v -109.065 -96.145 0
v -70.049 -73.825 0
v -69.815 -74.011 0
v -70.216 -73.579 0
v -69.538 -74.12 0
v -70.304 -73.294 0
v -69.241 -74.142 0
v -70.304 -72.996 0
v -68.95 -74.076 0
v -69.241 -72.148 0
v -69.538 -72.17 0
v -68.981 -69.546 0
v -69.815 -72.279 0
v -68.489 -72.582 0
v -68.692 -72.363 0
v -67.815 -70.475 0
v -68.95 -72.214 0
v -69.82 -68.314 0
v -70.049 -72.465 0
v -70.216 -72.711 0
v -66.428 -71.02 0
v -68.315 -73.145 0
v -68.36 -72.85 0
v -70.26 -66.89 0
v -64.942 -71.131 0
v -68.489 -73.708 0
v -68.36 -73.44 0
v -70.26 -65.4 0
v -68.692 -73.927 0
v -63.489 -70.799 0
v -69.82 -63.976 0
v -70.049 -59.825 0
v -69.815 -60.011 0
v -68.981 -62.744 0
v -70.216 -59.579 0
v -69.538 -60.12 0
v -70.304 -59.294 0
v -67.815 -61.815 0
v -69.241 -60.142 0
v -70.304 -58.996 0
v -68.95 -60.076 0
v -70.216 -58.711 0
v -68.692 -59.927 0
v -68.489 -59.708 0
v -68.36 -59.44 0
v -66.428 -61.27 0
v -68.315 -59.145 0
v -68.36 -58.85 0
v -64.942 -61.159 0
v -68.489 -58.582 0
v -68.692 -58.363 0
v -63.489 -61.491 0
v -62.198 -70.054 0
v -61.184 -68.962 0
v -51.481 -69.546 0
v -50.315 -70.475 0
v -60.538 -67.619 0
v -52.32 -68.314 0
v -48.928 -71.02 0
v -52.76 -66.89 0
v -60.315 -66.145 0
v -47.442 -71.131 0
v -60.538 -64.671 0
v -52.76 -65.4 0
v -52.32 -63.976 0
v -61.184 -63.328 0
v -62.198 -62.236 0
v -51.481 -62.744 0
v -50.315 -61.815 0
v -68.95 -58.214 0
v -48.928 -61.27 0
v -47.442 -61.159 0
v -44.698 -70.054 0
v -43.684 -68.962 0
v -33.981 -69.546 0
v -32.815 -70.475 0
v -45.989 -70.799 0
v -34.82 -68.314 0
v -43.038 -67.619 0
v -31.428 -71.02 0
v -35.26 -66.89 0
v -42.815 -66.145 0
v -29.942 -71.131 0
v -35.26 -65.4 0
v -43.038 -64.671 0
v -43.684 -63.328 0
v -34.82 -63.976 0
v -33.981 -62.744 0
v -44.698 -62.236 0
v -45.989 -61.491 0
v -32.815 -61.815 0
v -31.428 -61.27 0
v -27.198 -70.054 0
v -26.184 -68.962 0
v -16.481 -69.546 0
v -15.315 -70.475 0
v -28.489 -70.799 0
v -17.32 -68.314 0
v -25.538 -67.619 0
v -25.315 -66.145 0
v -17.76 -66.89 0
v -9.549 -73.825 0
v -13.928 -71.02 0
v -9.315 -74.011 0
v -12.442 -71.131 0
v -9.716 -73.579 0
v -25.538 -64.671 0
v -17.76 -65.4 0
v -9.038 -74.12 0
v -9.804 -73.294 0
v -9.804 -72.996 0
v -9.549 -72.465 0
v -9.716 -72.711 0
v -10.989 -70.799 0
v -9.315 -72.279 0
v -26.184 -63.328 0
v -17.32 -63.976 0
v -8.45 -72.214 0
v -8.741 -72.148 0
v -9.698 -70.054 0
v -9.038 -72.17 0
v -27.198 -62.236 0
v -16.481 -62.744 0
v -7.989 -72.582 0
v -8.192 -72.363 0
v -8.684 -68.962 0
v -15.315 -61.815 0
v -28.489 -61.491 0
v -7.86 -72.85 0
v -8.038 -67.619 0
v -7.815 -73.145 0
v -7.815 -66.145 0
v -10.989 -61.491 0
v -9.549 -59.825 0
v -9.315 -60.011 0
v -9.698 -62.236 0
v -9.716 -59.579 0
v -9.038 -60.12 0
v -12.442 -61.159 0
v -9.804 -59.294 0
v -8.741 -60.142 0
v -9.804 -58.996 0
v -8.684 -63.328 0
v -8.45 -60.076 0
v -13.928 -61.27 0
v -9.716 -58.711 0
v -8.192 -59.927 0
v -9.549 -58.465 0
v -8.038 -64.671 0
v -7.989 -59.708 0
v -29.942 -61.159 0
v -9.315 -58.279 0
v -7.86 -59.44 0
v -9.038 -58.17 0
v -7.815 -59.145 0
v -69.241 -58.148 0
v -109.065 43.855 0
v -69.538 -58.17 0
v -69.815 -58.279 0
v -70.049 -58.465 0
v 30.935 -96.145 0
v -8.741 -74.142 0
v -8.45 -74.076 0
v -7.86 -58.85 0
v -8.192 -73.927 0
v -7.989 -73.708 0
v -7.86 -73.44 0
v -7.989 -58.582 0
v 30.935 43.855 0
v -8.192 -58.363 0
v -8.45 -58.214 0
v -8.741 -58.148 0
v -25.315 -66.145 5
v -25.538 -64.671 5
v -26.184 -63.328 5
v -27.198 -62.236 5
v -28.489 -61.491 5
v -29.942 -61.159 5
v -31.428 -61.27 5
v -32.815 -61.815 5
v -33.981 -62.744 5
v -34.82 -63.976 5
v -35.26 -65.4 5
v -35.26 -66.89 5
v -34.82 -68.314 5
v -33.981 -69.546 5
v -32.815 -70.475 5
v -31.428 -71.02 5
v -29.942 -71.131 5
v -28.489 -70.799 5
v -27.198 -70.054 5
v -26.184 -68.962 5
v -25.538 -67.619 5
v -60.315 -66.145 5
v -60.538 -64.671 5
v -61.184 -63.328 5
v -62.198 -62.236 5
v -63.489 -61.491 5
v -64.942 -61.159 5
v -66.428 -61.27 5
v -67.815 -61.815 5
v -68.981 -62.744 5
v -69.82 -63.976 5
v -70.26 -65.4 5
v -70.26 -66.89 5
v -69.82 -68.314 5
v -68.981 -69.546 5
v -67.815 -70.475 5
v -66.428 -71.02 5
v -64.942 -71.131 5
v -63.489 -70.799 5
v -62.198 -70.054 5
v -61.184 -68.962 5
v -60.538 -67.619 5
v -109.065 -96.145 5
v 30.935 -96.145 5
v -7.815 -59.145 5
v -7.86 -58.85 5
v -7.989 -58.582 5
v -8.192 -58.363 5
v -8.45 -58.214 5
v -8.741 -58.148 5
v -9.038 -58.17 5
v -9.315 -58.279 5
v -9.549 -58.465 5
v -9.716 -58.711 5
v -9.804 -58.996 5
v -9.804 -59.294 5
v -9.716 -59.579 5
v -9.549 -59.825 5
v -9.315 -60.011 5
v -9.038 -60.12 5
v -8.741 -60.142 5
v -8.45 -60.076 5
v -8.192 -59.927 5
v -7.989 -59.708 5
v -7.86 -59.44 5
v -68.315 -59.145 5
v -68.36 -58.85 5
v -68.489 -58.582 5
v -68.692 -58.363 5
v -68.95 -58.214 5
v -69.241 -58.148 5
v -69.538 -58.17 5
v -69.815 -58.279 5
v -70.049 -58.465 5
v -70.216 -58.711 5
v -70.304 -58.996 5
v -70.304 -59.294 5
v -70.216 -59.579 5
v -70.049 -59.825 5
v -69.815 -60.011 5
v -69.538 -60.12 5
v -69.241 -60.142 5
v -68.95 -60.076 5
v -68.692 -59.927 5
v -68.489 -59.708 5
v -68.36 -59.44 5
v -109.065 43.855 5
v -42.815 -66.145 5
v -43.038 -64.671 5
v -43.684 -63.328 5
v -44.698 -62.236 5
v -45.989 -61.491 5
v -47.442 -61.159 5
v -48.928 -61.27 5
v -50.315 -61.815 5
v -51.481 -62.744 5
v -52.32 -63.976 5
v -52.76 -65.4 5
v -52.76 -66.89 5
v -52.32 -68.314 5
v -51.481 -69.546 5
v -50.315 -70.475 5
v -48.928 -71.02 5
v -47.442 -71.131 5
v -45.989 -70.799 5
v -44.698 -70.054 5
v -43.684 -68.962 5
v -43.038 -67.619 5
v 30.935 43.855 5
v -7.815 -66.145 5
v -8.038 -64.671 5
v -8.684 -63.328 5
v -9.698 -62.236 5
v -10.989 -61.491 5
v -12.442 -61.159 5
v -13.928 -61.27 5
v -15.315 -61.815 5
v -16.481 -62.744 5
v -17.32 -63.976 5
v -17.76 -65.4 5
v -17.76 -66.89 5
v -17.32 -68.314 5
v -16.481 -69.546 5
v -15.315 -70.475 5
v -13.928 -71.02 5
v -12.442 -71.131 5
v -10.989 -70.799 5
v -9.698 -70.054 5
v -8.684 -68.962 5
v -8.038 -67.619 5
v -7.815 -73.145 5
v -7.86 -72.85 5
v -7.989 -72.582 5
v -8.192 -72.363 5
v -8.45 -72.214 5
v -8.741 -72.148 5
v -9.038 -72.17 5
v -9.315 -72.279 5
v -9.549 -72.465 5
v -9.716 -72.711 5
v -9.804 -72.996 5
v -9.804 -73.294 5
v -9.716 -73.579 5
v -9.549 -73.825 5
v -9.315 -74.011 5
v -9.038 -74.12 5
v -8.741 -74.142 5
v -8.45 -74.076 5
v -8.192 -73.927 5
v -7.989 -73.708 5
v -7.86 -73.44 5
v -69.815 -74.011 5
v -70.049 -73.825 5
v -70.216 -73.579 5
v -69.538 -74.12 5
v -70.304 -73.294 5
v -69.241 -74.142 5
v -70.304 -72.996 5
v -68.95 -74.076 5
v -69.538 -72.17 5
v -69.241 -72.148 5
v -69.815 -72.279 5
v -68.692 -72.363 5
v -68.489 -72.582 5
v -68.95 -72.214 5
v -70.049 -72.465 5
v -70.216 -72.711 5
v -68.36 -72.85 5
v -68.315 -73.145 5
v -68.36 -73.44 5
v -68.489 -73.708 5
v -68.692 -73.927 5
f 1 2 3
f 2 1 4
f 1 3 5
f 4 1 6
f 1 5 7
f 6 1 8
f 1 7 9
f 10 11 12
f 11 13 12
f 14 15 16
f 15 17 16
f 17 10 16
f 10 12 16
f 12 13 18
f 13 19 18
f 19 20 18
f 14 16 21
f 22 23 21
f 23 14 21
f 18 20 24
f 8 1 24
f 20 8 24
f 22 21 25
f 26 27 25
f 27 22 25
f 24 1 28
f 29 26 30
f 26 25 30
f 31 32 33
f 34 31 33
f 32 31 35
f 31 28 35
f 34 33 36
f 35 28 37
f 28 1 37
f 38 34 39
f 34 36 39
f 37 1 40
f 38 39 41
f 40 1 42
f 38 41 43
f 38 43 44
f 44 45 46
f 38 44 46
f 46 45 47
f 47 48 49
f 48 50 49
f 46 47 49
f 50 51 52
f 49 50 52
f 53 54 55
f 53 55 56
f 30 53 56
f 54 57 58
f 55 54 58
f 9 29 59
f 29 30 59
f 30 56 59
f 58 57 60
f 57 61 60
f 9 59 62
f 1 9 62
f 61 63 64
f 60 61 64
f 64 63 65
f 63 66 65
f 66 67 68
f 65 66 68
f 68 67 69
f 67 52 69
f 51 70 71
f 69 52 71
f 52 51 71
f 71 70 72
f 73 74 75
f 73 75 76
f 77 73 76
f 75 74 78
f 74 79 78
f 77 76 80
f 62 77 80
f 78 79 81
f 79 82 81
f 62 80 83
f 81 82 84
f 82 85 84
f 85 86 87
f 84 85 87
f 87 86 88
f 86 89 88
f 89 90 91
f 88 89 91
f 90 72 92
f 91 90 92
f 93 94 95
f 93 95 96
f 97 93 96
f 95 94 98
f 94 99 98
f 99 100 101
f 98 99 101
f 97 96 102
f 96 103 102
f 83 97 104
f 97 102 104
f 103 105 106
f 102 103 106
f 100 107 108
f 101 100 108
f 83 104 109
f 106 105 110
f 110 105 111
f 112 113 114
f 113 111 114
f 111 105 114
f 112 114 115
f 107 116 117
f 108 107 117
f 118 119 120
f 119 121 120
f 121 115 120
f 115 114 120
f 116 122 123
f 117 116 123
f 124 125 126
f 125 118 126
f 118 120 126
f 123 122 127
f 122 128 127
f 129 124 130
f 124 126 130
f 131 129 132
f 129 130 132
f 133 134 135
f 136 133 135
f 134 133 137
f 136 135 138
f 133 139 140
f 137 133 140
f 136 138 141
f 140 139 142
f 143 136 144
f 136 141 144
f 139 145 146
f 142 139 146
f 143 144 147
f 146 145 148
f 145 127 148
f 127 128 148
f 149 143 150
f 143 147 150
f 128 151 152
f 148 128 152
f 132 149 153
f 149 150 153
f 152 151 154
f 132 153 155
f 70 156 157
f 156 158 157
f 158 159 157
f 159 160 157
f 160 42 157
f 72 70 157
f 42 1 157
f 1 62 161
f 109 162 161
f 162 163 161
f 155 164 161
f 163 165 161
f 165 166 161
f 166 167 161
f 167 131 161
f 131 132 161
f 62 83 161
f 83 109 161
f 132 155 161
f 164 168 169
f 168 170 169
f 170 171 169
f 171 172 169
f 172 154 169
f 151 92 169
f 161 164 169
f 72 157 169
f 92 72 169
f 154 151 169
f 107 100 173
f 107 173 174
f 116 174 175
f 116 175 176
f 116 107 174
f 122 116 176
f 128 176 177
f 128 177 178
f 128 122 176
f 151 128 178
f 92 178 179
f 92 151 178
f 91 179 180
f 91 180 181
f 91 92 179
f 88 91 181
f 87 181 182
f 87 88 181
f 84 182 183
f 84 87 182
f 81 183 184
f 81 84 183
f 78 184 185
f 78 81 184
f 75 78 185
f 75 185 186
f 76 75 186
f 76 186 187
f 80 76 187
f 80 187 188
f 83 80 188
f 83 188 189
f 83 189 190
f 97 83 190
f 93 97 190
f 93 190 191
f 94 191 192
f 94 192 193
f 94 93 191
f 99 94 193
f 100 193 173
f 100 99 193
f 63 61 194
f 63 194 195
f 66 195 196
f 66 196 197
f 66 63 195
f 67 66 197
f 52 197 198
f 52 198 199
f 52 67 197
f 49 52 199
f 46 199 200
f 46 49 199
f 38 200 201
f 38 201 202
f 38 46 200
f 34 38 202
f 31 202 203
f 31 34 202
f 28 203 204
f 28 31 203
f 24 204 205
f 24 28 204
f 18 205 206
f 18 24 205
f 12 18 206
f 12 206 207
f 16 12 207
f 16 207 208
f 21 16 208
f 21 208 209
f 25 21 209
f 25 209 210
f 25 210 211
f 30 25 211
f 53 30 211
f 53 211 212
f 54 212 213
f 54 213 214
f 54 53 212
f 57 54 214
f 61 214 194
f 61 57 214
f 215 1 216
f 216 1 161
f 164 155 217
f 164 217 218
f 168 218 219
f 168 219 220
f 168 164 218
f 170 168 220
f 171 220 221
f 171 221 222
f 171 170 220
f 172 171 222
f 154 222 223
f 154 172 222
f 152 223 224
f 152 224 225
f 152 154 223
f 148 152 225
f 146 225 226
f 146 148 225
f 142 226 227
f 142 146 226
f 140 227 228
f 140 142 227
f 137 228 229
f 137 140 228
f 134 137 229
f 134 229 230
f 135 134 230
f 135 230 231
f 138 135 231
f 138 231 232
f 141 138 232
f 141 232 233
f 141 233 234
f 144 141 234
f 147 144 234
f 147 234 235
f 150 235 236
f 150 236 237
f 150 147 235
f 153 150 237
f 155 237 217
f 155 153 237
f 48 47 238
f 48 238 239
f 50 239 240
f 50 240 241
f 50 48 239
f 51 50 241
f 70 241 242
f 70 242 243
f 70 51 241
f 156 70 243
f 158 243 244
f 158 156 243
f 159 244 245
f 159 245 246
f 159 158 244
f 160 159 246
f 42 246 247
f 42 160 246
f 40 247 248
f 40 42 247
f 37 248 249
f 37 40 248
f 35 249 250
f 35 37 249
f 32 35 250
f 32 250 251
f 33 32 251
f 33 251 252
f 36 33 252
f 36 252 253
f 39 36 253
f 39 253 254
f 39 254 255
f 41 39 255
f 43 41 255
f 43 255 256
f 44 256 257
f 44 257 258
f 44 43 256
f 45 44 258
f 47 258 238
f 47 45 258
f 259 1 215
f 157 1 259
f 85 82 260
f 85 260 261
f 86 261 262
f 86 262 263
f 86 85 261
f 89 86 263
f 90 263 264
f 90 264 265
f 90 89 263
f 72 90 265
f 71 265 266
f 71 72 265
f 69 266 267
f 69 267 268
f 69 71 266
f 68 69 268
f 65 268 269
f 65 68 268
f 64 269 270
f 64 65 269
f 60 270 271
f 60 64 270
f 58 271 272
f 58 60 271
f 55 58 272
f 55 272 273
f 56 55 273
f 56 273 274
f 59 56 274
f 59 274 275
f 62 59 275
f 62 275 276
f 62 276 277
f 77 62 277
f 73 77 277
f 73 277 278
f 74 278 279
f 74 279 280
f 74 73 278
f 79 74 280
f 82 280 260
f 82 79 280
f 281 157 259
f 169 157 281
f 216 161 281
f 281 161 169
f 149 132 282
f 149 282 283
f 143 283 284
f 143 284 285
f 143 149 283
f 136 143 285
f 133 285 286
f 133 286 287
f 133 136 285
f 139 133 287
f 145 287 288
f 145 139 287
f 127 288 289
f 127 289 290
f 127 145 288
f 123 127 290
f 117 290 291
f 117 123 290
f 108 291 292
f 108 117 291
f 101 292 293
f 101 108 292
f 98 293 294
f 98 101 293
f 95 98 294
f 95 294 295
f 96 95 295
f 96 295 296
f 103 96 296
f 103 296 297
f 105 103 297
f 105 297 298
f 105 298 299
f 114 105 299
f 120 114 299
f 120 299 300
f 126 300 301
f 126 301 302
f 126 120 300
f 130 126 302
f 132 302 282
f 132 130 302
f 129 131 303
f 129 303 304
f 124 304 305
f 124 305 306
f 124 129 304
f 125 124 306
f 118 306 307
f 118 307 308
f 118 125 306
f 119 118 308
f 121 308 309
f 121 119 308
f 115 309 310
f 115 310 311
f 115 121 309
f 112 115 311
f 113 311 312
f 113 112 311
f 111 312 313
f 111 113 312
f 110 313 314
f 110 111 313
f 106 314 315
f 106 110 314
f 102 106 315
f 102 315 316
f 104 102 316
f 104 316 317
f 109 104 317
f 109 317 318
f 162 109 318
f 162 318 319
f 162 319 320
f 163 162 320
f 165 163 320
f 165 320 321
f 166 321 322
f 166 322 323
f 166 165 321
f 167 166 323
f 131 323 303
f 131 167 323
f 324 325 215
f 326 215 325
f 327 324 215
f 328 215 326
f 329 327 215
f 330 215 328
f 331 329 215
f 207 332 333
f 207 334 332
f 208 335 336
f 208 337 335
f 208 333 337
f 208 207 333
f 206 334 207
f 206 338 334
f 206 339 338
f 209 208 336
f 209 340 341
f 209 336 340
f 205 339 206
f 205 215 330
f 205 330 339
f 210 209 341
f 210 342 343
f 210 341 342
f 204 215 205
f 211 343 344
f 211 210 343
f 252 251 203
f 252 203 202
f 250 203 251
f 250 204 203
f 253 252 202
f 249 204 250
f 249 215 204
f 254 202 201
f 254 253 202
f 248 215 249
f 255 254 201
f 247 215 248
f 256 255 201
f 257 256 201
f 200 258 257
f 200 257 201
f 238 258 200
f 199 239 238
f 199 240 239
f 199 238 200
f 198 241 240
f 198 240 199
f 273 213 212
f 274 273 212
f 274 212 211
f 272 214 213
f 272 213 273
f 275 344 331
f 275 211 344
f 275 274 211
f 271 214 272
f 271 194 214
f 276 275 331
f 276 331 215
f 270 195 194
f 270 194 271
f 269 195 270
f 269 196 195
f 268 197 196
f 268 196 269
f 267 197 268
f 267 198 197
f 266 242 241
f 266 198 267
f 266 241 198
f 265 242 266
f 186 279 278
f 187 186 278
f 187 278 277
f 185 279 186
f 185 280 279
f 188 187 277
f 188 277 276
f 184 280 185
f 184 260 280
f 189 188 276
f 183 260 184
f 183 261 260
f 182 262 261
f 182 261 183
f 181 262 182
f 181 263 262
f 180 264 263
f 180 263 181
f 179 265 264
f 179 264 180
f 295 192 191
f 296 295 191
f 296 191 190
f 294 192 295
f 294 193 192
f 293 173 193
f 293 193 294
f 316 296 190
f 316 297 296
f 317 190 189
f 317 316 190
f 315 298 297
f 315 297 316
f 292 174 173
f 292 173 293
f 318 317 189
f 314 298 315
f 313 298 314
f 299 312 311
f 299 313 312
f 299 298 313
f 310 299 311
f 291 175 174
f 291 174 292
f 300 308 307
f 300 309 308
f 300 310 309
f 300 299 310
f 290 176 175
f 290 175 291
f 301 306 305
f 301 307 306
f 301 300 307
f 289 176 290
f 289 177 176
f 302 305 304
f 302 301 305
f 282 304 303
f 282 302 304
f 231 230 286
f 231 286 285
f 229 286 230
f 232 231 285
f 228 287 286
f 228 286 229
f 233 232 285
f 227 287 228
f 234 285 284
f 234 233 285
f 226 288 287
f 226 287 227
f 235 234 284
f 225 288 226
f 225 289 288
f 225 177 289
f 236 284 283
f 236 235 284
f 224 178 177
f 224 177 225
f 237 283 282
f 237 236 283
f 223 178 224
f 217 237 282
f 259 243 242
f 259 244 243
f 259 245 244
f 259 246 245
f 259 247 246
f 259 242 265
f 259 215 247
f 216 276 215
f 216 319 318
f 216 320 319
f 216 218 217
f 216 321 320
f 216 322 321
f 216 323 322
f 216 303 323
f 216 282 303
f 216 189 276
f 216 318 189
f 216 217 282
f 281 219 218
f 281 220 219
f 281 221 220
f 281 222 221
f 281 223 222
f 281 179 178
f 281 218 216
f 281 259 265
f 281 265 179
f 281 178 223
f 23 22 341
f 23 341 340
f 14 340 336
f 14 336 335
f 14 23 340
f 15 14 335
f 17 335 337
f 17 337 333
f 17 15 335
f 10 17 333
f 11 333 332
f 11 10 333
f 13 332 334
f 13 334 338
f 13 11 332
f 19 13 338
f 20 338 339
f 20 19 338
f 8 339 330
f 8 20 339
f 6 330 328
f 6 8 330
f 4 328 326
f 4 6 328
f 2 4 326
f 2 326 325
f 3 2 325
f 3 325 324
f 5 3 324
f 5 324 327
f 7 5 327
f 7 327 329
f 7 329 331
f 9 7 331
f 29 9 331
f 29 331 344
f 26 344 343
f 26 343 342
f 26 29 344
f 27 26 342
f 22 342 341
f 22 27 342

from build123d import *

# Parameters (mm, degrees)
SKETCH1_W           = 140
SKETCH1_H           = 140
SKETCH1_W_2         = 68.5
SKETCH1_H_2         = 22
BOSS_EXTRUDE1_DEPTH = 5
SKETCH1_4_W         = 140
SKETCH1_4_H         = 140
SKETCH1_4_R         = 5
SKETCH1_4_R_2       = 1
BOSS_EXTRUDE3_DEPTH = 5


with BuildPart() as part:
    # Sketch1 → Boss-Extrude1 (new body)
    with BuildSketch(Plane.XY):
        with Locations((-39.065487154, -26.144980504)):
            Rectangle(SKETCH1_W, SKETCH1_H)
        with Locations((-39.065487154, -66.144980504)):
            Rectangle(SKETCH1_W_2, SKETCH1_H_2, mode=Mode.SUBTRACT)
    extrude(amount=BOSS_EXTRUDE1_DEPTH)

    # Sketch1<4> → Boss-Extrude3 (add)
    with BuildSketch(Plane.XY):
        with Locations((-39.065487154, -26.144980504)):
            Rectangle(SKETCH1_4_W, SKETCH1_4_H)
        with Locations((-30.315487154, -66.144980504)):
            Circle(SKETCH1_4_R, mode=Mode.SUBTRACT)
        with Locations((-8.815487154, -73.144980504)):
            Circle(SKETCH1_4_R_2, mode=Mode.SUBTRACT)
        with Locations((-12.815487154, -66.144980504)):
            Circle(SKETCH1_4_R, mode=Mode.SUBTRACT)
        with Locations((-8.815487154, -59.144980504)):
            Circle(SKETCH1_4_R_2, mode=Mode.SUBTRACT)
        with Locations((-69.315487154, -73.144980504)):
            Circle(SKETCH1_4_R_2, mode=Mode.SUBTRACT)
        with Locations((-65.315487154, -66.144980504)):
            Circle(SKETCH1_4_R, mode=Mode.SUBTRACT)
        with Locations((-47.815487154, -66.144980504)):
            Circle(SKETCH1_4_R, mode=Mode.SUBTRACT)
        with Locations((-69.315487154, -59.144980504)):
            Circle(SKETCH1_4_R_2, mode=Mode.SUBTRACT)
    extrude(amount=BOSS_EXTRUDE3_DEPTH)


solid = part.part
